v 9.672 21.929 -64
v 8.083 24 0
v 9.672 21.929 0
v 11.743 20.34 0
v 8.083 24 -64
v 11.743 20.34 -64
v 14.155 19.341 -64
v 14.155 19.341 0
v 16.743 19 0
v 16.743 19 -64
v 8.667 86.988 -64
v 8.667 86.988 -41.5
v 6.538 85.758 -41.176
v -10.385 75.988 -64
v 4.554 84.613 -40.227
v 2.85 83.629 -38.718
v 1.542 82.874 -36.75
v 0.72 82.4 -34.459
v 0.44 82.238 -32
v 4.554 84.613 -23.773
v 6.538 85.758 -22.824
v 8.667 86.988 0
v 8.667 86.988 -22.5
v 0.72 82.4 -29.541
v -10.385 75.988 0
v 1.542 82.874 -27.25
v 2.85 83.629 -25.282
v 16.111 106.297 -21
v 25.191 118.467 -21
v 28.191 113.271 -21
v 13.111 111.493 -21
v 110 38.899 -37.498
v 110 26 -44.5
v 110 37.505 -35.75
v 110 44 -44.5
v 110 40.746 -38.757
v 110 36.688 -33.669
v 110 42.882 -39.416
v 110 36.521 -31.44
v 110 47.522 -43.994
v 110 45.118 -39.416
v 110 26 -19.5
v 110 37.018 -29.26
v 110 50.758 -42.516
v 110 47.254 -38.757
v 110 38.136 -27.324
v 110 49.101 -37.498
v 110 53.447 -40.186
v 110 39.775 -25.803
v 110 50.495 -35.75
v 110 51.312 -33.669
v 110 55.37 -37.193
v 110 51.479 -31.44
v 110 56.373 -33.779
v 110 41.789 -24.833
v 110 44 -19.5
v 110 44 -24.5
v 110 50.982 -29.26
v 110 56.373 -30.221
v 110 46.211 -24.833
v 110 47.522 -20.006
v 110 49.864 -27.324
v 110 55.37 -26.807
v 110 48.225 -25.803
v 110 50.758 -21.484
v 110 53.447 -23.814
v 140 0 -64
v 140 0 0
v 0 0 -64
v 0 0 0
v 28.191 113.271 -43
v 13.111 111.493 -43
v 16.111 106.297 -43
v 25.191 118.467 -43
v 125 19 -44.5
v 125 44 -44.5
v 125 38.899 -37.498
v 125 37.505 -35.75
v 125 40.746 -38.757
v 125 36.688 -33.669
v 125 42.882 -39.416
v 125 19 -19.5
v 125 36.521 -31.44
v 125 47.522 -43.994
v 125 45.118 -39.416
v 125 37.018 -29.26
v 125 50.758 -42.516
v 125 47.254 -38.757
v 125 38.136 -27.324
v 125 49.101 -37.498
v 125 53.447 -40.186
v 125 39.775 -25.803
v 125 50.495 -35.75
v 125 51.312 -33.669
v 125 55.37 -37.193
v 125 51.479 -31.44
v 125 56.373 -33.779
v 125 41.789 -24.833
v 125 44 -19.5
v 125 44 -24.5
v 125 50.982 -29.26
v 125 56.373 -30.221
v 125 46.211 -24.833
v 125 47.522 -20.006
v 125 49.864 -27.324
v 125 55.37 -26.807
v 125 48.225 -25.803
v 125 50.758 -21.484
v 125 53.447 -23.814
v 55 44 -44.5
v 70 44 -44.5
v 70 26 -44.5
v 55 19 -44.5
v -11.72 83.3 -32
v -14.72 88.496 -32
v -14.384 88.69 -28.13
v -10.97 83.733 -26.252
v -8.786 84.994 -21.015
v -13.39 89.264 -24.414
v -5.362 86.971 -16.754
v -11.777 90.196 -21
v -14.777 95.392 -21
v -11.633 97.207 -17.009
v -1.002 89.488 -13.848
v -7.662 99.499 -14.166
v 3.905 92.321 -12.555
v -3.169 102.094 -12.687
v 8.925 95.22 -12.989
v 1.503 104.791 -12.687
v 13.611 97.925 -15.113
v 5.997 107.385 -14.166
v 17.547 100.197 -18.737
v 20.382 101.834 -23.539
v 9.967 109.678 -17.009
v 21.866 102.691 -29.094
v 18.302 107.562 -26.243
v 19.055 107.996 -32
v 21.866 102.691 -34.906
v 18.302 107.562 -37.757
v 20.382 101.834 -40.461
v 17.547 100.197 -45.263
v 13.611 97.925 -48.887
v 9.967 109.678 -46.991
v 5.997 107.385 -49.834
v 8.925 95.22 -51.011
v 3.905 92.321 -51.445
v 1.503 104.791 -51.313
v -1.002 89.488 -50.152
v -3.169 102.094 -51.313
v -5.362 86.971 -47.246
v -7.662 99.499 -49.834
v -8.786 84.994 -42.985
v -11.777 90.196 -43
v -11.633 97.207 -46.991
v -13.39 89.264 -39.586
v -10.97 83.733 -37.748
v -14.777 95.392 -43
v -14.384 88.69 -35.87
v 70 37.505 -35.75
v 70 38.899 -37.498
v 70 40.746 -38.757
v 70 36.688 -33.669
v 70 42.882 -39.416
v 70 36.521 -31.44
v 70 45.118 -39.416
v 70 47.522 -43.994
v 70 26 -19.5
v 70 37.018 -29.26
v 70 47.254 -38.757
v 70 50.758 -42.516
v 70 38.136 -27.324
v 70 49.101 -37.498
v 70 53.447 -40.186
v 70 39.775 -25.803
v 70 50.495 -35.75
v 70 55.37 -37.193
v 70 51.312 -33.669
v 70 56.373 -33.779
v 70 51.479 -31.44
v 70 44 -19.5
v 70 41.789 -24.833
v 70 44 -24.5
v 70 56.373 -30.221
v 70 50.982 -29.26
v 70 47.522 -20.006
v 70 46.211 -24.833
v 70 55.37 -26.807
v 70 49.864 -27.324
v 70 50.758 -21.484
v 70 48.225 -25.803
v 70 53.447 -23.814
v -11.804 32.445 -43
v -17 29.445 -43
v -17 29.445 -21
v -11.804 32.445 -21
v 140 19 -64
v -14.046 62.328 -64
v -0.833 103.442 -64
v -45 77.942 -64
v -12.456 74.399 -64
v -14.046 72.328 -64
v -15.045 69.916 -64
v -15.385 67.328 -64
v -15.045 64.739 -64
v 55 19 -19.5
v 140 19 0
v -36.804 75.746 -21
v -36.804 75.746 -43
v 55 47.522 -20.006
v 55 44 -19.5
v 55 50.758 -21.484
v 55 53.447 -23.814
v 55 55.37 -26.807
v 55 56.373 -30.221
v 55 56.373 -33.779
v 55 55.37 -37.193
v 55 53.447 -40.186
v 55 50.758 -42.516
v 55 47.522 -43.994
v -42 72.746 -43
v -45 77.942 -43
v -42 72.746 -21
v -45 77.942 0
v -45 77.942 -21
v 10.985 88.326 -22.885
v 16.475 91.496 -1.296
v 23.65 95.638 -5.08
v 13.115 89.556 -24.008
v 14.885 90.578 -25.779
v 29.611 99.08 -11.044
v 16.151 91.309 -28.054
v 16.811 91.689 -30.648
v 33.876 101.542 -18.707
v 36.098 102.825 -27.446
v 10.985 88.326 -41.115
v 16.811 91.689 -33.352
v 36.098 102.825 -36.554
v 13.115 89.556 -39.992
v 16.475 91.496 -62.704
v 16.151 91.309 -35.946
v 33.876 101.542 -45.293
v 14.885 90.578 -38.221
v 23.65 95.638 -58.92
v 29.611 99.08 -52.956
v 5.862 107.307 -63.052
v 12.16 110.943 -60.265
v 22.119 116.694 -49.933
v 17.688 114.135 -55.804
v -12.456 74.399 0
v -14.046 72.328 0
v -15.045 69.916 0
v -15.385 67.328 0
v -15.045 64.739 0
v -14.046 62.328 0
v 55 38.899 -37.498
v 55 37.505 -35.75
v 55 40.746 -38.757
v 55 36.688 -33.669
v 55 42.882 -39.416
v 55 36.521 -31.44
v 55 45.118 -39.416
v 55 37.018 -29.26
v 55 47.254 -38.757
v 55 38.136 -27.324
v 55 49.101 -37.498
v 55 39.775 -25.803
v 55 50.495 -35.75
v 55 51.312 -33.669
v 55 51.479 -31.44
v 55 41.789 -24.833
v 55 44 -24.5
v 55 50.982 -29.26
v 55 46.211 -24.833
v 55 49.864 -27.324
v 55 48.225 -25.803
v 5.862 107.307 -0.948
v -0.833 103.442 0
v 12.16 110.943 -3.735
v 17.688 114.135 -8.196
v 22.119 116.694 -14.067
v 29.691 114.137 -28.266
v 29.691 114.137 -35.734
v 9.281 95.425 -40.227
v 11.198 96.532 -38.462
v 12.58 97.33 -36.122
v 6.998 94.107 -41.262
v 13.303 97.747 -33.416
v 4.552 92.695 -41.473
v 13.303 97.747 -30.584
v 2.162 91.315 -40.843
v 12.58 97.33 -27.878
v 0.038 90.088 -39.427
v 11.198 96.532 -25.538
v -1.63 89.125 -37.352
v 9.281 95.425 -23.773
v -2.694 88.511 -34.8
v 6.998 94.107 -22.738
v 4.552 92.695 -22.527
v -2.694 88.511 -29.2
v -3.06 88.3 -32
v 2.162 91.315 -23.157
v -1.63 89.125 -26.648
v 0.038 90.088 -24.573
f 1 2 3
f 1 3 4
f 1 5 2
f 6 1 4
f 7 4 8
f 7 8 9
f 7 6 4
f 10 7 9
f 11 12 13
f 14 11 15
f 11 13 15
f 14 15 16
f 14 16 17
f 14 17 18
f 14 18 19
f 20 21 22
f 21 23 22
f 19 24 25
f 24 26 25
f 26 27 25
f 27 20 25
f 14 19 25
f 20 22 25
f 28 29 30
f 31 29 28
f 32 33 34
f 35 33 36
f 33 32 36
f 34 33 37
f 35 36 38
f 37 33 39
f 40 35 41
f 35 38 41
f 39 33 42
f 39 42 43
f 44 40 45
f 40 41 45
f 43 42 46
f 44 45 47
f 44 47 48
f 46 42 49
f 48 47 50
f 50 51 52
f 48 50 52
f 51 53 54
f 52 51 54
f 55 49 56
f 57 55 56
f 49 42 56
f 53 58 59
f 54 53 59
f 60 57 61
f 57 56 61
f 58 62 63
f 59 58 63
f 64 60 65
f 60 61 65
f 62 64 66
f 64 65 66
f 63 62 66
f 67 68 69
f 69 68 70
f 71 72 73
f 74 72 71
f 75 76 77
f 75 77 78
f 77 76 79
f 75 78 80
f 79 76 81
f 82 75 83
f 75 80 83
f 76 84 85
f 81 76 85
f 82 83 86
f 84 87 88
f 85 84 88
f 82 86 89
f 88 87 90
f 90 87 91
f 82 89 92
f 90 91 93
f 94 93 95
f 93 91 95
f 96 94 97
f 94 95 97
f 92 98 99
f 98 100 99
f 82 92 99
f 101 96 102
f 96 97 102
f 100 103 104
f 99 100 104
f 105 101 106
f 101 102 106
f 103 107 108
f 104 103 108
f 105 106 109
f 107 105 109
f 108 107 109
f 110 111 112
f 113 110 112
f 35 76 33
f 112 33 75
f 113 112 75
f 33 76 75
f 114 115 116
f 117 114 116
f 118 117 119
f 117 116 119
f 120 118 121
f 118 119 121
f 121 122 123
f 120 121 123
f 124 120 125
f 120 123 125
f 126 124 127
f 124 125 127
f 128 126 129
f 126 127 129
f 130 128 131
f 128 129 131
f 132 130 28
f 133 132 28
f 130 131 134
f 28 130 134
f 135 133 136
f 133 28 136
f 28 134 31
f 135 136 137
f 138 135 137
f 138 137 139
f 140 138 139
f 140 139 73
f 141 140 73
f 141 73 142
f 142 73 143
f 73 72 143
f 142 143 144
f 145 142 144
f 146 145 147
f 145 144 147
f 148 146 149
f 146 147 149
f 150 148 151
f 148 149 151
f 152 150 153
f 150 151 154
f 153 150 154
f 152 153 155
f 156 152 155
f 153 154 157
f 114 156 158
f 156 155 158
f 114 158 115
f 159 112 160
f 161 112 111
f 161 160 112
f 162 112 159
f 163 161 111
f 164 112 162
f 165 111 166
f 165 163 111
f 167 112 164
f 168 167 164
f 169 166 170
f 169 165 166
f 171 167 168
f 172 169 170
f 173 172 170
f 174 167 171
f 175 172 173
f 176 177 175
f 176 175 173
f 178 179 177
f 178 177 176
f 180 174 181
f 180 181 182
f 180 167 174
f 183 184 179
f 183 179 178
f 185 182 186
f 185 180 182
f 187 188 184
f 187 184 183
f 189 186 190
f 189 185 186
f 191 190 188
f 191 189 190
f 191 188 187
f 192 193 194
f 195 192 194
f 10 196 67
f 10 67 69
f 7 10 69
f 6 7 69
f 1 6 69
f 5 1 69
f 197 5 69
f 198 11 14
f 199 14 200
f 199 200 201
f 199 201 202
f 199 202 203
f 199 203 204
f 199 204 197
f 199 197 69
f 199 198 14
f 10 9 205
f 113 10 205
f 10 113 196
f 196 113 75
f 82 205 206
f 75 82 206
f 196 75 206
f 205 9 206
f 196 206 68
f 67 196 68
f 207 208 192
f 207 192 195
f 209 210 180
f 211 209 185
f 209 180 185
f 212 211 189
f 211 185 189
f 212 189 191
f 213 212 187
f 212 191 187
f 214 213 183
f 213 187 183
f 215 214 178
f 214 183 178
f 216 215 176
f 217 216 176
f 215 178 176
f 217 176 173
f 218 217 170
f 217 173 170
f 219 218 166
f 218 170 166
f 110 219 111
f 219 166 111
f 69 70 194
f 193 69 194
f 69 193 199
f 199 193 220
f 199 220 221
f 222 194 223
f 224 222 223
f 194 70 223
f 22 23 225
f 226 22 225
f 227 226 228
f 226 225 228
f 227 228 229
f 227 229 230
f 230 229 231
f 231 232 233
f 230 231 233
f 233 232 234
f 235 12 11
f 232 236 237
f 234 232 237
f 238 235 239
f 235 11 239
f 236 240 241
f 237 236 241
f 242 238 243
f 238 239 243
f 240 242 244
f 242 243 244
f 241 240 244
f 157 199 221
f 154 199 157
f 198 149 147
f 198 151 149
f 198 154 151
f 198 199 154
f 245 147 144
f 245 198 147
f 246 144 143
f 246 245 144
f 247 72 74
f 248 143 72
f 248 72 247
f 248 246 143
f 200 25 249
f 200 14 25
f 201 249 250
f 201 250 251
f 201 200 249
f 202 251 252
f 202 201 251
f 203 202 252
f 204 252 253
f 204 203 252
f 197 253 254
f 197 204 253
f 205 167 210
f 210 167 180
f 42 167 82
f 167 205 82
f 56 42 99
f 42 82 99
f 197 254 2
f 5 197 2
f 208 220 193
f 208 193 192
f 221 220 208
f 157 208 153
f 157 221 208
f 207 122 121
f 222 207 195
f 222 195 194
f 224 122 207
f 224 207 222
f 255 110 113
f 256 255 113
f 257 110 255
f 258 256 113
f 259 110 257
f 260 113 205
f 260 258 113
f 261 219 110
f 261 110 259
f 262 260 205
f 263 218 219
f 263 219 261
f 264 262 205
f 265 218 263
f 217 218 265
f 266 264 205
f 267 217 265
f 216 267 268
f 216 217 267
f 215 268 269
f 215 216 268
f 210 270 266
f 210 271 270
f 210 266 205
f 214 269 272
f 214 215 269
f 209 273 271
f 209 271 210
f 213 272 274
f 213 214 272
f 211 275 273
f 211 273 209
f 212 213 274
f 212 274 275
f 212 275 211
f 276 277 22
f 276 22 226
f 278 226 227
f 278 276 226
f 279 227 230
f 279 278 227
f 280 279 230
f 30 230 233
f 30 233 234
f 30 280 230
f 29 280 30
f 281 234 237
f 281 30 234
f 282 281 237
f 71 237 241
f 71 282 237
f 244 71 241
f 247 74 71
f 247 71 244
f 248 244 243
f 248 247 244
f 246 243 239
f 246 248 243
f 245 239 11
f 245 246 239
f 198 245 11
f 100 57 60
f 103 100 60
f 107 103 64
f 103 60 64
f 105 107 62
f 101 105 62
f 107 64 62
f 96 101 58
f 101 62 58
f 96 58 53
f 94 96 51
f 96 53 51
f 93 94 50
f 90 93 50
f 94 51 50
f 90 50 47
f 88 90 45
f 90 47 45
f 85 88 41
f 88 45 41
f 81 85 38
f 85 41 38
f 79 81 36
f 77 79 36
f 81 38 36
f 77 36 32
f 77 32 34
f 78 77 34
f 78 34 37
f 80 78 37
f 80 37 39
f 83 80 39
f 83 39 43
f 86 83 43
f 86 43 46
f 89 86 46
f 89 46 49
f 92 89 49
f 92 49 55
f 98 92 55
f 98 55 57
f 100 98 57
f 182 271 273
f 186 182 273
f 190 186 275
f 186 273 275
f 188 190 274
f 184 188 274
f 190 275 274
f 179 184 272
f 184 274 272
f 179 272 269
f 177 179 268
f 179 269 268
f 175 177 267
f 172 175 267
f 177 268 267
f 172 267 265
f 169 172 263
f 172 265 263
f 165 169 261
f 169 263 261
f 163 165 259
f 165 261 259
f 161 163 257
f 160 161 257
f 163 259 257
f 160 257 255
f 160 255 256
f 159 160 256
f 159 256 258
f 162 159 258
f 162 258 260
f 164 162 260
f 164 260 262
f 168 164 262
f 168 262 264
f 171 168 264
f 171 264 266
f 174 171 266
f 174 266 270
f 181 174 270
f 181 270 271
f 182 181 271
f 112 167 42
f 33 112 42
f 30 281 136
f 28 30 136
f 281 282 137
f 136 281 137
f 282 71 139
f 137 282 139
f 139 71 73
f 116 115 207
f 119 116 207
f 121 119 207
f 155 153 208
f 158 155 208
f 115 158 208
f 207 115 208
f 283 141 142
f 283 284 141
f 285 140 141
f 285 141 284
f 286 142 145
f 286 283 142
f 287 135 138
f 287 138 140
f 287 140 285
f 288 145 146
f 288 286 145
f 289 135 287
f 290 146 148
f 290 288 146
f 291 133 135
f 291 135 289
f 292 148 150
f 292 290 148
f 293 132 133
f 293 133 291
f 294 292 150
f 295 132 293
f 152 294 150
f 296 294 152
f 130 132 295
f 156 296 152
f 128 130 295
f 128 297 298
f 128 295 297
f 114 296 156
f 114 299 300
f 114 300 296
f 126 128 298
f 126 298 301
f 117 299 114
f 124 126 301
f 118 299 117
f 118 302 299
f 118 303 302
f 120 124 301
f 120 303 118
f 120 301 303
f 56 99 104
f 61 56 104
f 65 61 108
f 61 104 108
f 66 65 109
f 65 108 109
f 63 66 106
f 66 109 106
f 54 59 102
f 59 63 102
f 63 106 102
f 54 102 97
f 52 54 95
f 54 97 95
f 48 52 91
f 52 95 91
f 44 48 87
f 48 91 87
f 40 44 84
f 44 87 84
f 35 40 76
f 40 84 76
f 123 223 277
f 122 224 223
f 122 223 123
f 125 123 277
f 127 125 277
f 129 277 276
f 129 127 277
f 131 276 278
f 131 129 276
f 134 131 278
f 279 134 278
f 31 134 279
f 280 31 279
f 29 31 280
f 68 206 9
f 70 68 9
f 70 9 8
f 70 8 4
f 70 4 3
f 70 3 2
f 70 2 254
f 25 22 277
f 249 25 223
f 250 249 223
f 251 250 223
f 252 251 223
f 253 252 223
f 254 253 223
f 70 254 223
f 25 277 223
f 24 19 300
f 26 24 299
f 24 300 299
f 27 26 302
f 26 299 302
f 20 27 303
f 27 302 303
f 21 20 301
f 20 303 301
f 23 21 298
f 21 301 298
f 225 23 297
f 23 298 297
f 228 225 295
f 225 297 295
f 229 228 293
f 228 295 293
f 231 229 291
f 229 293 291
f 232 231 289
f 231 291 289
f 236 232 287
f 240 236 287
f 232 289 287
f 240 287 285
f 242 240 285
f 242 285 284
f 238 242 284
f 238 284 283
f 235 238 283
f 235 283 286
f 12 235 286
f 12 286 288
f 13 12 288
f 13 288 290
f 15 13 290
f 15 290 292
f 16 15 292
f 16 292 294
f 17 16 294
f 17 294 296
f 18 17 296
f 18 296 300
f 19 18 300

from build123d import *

# Parameters (mm, degrees)
BOSS_EXTRU_1_DEPTH      = 64
BOSS_EXTRU_2_DEPTH      = 19
ENL_V_MAT_EXTRU_1_REACH = 212.704
ESQUISSE3_R             = 9.5
ENL_V_MAT_EXTRU_2_DEPTH = 6
ESQUISSE5_R             = 19.5
ENL_V_MAT_EXTRU_3_DEPTH = 12
ESQUISSE6_W             = 22
ESQUISSE6_H             = 56
ENL_V_MAT_EXTRU_4_DEPTH = 6
BOSS_EXTRU_3_DEPTH      = 70
ESQUISSE9_W             = 40
ESQUISSE9_H             = 30.5
ENL_V_MAT_EXTRU_5_DEPTH = 189.718687482
ESQUISSE10_R            = 7.5
ENL_V_MAT_EXTRU_6_DEPTH = 168.72147449
CONG_1_R                = 10


with BuildPart() as part:
    # Esquisse1 → Boss.-Extru.1 (new body)
    with BuildSketch(Plane.XY):
        Polygon((0, 0), (-45, 77.942286341), (-0.832704407, 103.442286341), (8.667295593, 86.987803669), (-19.045517328, 70.987803669), (10.969655115, 19), (140, 19), (140, 0), align=None)
    extrude(amount=-BOSS_EXTRU_1_DEPTH)

    # Esquisse2 → Boss.-Extru.2 (add)
    with BuildSketch(Plane(origin=(-45, 77.942286341, 0), x_dir=(0.8660254037844398, 0.49999999999999806, 0), z_dir=(-0.499999999999998, 0.8660254037844397, 0))):
        with BuildLine():
            Line((51, 64), (51, 0))
            ThreePointArc((51, 0), (83, 32), (51, 64))
        make_face()
    extrude(amount=-BOSS_EXTRU_2_DEPTH)

    # Esquisse3 → Enlèv. mat.-Extru.1 (cut, up to next)
    with BuildSketch(Plane(origin=(-45, 77.942286341, 0), x_dir=(0.8660254037844398, 0.49999999999999806, 0), z_dir=(-0.499999999999998, 0.8660254037844397, 0)), mode=Mode.PRIVATE) as enl_v_mat_extru_1_sk1:
        with Locations(Location((51, 32, 0), (0, 0, 180))):
            Circle(ESQUISSE3_R)
    enl_v_mat_extru_1_tool1 = extrude(enl_v_mat_extru_1_sk1.sketch, amount=-ENL_V_MAT_EXTRU_1_REACH, mode=Mode.PRIVATE) & part.part
    add(enl_v_mat_extru_1_tool1.solids().sort_by_distance((-0.832704, 103.442286, -32))[0], mode=Mode.SUBTRACT)

    # Esquisse4 → Enlèv. mat.-Extru.2 (cut)
    with BuildSketch(Plane(origin=(-45, 77.942286341, 0), x_dir=(0.8660254037844398, 0.49999999999999806, 0), z_dir=(-0.499999999999998, 0.8660254037844397, 0))):
        with BuildLine():
            Line((0, 43), (81.049958403, 43))
            ThreePointArc((81.049958403, 43), (83, 32), (81.049958403, 21))
            Line((81.049958403, 21), (0, 21))
            Line((0, 21), (0, 43))
        make_face()
    extrude(amount=-ENL_V_MAT_EXTRU_2_DEPTH, mode=Mode.SUBTRACT)

    # Esquisse5 → Enlèv. mat.-Extru.3 (cut)
    with BuildSketch(Plane(origin=(-45, 77.942286341, 0), x_dir=(0.8660254037844398, 0.49999999999999806, 0), z_dir=(-0.499999999999998, 0.8660254037844397, 0))):
        with Locations(Location((51, 32, 0), (0, 0, 180))):
            Circle(ESQUISSE5_R)
    extrude(amount=-ENL_V_MAT_EXTRU_3_DEPTH, mode=Mode.SUBTRACT)

    # Esquisse6 → Enlèv. mat.-Extru.4 (cut)
    with BuildSketch(Plane(origin=(0, 0, 0), x_dir=(0, 0, 1), z_dir=(-0.8660254037844398, -0.49999999999999806, 0))):
        with Locations((-32, 62)):
            Rectangle(ESQUISSE6_W, ESQUISSE6_H)
    extrude(amount=-ENL_V_MAT_EXTRU_4_DEPTH, mode=Mode.SUBTRACT)

    # Esquisse8 → Boss.-Extru.3 (add)
    with BuildSketch(Plane(origin=(125, 0, 0), x_dir=(0, 0, -1), z_dir=(1, 0, 0))):
        with BuildLine():
            Line((19.5, 19), (19.5, 44))
            ThreePointArc((19.5, 44), (32, 56.5), (44.5, 44))
            Line((44.5, 44), (44.5, 19))
            Line((44.5, 19), (19.5, 19))
        make_face()
    extrude(amount=-BOSS_EXTRU_3_DEPTH)

    # Esquisse9 → Enlèv. mat.-Extru.5 (cut, through all)
    with BuildSketch(Plane.XY.offset(-19.5)):
        with Locations((90, 41.25)):
            Rectangle(ESQUISSE9_W, ESQUISSE9_H)
    extrude(amount=-ENL_V_MAT_EXTRU_5_DEPTH, mode=Mode.SUBTRACT)

    # Esquisse10 → Enlèv. mat.-Extru.6 (cut, through all)
    with BuildSketch(Plane.ZY.offset(-55)):
        with Locations((-32, 44)):
            Circle(ESQUISSE10_R)
    extrude(amount=-ENL_V_MAT_EXTRU_6_DEPTH, mode=Mode.SUBTRACT)

    # Congé1
    cong_1_edges = [part.edges().sort_by_distance(p)[0] for p in [
        (-19.045517328, 70.987803669, -32),
        (10.969655115, 19, -32),
    ]]
    fillet(cong_1_edges, radius=CONG_1_R)


solid = part.part
